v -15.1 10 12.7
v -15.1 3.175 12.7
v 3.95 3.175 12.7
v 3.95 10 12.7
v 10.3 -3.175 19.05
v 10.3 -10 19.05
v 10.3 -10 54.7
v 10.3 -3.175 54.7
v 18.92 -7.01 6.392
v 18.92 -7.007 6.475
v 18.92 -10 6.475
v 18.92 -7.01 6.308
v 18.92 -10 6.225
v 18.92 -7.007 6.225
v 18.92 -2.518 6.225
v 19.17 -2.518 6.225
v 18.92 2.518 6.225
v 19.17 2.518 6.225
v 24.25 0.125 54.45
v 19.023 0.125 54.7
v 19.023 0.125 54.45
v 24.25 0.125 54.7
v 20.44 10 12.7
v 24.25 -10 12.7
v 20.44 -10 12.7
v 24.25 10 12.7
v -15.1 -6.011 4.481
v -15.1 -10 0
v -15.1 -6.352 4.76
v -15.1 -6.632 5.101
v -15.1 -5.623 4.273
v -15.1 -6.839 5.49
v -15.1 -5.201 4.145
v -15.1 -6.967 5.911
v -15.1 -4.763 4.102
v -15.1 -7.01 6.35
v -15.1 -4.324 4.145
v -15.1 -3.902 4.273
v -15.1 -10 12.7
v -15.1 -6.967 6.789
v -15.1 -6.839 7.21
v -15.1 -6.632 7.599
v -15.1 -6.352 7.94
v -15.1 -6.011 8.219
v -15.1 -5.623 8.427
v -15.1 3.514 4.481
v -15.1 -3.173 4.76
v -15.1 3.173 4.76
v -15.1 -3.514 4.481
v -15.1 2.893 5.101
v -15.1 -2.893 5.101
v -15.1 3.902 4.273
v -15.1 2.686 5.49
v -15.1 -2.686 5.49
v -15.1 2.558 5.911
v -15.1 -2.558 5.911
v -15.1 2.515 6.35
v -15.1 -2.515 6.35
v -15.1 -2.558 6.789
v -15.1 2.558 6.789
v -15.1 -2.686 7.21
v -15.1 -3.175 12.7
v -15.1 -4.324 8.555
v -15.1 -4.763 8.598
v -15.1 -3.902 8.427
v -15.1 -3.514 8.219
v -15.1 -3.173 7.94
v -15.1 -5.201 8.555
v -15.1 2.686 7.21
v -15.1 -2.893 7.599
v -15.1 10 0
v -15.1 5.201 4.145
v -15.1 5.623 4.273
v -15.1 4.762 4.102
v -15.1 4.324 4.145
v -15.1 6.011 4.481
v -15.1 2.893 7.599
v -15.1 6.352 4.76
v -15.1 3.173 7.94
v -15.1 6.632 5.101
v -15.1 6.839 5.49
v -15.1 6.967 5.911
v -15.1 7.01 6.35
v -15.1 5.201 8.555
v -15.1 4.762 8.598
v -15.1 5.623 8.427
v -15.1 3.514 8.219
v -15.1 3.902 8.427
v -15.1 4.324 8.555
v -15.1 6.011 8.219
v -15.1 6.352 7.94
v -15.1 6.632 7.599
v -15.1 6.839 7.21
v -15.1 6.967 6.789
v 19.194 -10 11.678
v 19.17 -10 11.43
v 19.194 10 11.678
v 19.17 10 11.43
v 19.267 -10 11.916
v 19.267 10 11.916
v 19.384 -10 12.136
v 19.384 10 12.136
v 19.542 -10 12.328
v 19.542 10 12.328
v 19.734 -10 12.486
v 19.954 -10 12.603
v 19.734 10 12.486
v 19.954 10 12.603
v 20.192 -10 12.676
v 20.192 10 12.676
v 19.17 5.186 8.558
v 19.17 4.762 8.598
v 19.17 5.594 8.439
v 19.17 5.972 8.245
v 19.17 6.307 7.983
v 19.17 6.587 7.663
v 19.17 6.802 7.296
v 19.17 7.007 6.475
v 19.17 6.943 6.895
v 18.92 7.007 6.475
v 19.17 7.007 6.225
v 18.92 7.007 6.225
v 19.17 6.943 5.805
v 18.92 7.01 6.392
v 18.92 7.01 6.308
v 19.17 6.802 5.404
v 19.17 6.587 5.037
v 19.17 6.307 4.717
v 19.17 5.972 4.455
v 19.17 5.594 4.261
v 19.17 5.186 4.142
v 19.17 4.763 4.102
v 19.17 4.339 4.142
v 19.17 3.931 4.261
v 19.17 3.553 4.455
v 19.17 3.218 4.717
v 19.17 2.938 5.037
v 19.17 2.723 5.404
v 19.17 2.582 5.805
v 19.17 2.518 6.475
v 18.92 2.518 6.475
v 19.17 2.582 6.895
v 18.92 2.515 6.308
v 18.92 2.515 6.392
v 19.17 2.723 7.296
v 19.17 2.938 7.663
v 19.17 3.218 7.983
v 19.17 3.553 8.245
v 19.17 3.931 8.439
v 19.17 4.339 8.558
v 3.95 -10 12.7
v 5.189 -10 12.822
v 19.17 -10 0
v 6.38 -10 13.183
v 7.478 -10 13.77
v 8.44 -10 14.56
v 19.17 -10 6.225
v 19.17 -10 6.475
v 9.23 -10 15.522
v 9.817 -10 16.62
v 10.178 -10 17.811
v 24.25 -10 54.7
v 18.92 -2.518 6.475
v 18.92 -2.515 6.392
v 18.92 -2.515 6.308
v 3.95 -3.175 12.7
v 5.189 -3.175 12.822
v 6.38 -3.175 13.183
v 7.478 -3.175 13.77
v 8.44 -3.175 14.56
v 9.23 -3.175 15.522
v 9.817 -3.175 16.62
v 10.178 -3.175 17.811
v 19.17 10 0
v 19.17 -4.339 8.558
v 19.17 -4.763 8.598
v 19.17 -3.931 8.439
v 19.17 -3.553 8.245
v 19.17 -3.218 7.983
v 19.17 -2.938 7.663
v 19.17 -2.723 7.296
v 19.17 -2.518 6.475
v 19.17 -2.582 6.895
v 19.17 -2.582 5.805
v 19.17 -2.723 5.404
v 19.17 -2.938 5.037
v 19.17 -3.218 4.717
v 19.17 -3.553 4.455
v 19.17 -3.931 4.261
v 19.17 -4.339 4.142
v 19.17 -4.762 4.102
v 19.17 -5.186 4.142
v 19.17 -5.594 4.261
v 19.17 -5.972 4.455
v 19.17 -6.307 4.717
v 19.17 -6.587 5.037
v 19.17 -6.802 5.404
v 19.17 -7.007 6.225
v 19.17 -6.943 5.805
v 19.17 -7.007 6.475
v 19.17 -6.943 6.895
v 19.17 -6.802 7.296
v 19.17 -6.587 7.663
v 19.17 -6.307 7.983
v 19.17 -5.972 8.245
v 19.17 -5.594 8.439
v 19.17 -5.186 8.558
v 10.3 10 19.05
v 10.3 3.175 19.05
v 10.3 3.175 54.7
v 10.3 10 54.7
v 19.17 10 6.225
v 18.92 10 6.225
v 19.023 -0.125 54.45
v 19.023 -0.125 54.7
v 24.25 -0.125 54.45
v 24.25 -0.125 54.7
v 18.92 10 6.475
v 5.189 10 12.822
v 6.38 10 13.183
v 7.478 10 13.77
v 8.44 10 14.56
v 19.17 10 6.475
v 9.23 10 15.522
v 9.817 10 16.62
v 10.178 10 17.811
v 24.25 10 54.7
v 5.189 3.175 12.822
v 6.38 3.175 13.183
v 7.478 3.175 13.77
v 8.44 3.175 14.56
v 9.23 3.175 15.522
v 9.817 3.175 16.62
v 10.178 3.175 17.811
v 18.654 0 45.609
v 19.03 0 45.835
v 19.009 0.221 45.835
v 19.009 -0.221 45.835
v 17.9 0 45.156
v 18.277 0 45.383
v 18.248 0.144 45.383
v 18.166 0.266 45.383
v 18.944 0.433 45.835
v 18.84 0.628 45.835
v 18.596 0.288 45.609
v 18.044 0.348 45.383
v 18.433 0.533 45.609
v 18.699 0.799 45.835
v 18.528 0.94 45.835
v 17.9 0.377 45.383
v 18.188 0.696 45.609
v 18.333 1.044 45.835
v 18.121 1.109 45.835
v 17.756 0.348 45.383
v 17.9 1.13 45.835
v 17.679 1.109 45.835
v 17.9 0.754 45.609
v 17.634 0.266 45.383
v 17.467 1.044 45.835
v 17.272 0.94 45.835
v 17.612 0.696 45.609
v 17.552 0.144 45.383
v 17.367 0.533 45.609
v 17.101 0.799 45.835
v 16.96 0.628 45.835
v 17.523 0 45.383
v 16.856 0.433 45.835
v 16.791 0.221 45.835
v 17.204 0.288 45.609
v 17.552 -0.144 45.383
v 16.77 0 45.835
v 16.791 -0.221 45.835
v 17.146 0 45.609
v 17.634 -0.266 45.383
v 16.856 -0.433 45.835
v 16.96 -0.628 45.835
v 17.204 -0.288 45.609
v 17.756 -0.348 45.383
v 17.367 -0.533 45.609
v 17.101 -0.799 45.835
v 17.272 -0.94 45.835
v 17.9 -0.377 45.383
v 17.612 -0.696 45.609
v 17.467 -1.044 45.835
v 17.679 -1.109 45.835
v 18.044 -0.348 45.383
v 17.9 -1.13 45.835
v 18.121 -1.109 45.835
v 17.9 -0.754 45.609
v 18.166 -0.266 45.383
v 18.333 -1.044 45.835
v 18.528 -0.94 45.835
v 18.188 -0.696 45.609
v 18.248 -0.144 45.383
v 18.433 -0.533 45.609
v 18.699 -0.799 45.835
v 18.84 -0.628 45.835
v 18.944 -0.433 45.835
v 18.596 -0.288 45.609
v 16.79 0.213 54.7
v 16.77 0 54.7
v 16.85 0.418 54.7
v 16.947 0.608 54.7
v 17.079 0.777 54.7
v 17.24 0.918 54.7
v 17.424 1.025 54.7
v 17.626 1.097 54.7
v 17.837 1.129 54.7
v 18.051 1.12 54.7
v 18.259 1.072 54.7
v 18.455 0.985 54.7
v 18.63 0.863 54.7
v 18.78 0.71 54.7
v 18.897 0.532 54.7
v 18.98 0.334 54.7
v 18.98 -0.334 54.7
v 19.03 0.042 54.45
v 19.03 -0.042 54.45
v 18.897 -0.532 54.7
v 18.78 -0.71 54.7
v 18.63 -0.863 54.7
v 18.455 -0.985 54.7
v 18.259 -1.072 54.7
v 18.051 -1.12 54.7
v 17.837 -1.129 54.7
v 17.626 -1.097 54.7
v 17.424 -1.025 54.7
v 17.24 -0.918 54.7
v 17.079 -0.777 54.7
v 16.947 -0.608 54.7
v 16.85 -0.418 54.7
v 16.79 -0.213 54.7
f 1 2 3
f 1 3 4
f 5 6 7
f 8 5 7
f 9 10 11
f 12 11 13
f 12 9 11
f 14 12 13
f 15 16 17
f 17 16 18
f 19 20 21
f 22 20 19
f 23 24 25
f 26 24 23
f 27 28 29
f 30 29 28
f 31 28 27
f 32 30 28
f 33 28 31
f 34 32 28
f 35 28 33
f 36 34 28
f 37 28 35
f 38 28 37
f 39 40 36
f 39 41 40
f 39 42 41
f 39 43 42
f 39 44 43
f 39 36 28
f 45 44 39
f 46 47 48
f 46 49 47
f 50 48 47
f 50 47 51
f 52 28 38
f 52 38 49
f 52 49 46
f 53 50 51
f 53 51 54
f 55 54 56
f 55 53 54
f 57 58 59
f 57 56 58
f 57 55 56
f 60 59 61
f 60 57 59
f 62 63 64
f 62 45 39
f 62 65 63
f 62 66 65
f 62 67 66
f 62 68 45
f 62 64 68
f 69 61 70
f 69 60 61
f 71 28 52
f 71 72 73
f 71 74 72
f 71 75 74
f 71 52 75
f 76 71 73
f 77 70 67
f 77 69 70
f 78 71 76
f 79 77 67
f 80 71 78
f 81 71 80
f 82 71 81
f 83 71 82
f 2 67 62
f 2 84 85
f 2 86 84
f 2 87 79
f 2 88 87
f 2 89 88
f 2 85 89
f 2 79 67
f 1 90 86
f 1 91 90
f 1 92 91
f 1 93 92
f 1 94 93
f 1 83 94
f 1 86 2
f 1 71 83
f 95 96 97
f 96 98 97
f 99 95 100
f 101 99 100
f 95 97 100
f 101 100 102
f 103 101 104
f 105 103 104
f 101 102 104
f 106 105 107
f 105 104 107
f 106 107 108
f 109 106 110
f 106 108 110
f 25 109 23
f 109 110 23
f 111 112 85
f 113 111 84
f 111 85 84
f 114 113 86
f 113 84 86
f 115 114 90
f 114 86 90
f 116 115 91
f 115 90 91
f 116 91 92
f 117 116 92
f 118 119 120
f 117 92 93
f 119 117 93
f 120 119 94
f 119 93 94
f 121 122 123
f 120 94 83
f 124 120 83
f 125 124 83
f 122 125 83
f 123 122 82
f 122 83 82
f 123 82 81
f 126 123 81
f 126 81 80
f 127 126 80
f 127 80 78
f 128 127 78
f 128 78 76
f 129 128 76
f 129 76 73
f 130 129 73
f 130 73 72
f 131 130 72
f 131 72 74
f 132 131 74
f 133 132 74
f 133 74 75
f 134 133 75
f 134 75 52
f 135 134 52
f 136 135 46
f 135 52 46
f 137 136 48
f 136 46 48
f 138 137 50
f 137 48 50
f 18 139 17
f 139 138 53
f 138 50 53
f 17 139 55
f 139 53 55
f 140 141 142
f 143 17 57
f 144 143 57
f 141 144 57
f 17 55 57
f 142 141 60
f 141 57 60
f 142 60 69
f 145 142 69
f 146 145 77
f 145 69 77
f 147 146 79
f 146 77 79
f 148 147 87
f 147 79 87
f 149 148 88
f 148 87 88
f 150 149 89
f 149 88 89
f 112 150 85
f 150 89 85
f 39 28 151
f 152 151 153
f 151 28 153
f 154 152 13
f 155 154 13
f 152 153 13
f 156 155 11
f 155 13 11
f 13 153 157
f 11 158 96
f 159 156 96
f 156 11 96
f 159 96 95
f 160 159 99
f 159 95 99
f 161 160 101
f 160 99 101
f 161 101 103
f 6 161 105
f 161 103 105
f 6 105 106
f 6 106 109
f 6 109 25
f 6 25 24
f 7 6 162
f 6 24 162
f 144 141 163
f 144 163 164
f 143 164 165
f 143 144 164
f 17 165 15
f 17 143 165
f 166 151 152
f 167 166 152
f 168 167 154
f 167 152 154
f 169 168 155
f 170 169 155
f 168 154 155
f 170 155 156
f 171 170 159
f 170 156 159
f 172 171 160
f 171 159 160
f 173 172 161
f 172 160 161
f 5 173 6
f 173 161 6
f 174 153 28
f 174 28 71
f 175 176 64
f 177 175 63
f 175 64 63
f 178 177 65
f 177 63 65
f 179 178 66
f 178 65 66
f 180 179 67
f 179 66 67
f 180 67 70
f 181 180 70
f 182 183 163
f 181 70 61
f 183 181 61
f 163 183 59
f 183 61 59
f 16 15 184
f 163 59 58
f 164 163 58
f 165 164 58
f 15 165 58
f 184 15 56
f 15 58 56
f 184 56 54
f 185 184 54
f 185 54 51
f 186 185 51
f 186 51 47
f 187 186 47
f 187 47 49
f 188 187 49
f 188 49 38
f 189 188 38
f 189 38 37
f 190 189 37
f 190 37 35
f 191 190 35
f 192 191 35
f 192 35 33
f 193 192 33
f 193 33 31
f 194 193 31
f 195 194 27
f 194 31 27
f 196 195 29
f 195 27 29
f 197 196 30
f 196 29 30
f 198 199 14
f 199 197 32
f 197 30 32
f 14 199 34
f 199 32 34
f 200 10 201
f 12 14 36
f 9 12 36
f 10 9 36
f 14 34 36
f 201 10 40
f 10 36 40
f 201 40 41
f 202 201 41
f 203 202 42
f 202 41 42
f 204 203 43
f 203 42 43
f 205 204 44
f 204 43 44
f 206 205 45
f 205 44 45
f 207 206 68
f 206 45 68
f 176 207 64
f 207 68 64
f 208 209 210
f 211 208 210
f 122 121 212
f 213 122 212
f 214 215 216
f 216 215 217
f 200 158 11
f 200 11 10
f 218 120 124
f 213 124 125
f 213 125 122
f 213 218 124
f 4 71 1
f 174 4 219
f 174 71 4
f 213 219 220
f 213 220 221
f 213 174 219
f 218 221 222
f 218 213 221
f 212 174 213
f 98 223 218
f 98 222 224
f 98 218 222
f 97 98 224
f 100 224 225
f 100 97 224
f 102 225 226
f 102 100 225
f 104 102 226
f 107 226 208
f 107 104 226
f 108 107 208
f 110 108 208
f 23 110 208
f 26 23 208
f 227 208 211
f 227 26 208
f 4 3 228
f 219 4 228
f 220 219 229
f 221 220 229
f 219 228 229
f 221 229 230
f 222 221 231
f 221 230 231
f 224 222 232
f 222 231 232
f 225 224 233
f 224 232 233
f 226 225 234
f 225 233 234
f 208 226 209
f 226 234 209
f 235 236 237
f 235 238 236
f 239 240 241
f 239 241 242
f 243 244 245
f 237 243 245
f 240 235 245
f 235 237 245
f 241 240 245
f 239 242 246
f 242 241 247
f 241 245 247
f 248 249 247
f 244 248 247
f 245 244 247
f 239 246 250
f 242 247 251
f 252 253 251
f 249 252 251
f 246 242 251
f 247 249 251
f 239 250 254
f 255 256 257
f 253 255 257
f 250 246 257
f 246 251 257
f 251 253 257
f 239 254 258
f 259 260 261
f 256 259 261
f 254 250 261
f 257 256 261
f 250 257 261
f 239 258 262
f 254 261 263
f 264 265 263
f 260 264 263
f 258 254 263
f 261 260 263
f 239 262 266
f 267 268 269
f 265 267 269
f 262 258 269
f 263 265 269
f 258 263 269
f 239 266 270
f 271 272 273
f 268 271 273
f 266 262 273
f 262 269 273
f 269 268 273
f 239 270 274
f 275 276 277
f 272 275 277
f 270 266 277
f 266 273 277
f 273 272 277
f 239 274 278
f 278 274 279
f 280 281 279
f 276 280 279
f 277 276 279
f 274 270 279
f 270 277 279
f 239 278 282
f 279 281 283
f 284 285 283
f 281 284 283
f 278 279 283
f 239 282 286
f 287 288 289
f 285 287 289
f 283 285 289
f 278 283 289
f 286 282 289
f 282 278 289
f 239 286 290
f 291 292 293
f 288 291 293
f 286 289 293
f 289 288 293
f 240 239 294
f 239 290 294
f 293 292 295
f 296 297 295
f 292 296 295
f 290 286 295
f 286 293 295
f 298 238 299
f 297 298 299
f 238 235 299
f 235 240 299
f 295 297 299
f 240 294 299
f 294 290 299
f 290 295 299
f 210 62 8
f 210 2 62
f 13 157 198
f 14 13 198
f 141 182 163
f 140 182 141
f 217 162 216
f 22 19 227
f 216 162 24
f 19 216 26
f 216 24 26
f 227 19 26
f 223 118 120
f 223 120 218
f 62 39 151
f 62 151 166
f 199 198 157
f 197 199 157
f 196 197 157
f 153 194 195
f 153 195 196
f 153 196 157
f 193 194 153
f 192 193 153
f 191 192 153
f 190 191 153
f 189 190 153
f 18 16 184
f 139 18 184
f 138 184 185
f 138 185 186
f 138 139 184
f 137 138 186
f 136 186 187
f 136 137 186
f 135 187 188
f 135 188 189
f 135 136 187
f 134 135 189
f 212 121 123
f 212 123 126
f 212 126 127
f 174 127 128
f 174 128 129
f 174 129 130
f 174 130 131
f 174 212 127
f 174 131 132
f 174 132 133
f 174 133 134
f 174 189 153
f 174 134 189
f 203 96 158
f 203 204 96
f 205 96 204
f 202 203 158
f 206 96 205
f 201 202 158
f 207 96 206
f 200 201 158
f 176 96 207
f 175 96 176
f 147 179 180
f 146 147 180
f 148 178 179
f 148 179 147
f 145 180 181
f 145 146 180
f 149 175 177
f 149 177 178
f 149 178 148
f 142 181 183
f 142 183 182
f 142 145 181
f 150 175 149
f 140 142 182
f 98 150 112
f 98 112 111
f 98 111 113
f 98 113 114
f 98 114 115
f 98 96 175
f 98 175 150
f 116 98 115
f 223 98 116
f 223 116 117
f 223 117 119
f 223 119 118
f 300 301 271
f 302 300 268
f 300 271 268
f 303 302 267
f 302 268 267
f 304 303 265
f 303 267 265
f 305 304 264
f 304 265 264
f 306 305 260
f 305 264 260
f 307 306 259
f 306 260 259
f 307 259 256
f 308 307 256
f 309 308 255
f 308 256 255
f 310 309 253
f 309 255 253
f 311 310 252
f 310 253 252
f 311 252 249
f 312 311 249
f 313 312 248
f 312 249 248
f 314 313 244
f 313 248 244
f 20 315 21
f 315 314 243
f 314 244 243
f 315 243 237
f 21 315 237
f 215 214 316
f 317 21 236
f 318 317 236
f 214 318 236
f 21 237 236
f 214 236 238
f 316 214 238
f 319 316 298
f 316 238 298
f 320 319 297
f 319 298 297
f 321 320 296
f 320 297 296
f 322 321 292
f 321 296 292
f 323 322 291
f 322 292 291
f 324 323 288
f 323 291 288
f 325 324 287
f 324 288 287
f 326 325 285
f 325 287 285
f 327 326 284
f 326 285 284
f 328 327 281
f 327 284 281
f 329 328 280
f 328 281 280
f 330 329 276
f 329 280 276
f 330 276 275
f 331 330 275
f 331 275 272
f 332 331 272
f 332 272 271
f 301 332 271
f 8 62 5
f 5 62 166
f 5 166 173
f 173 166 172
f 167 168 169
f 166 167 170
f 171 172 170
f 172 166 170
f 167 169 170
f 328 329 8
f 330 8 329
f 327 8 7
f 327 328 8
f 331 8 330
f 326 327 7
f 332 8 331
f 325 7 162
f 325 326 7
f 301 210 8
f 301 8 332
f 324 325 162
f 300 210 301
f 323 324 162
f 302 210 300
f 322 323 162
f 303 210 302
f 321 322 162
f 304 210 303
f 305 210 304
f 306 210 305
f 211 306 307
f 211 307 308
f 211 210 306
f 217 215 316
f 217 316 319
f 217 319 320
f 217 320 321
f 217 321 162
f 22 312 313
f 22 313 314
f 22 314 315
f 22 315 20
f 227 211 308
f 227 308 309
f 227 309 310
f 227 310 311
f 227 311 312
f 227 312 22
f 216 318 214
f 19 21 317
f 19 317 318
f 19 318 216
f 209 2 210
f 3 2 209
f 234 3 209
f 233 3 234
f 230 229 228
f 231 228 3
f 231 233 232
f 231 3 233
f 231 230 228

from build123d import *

# Parameters (mm, degrees)
SKETCH1_W                 = 24.25
SKETCH1_H                 = 20
EXTRUDE1_DEPTH            = 54.7
CUT_EXTRUDE1_DEPTH        = 21
SKETCH5_W                 = 12.7
SKETCH5_H                 = 20
EXTRUDE2_DEPTH            = 15.1
F_8_CLEARANCE_HOLE1_D     = 4.4958
F_4_40_TAPPED_HOLE1_D     = 2.2606
F_4_40_TAPPED_HOLE1_DEPTH = 8.8646
F_4_40_TAPPED_HOLE1_TIP   = 0.679152758
SKETCH11_W                = 12.7
SKETCH11_H                = 20
CUT_EXTRUDE2_DEPTH        = 5.08
FILLET1_R                 = 1.27
SKETCH12_W                = 0.25
SKETCH12_H                = 20
CUT_EXTRUDE3_DEPTH        = 0.25
EXTRUDE3_DEPTH            = 3.175
SKETCH14_W                = 6.35
SKETCH14_H                = 0.25
CUT_EXTRUDE4_DEPTH        = 0.25


with BuildPart() as part:
    # Sketch1 → Extrude1 (new body)
    with BuildSketch(Plane.XY):
        with Locations((12.125, 0)):
            Rectangle(SKETCH1_W, SKETCH1_H)
    extrude(amount=EXTRUDE1_DEPTH)

    # Sketch4 → Cut-Extrude1 (cut, through all)
    with BuildSketch(Plane.XZ.offset(10)):
        with BuildLine():
            Line((0, 12.7), (3.95, 12.7))
            ThreePointArc((3.95, 12.7), (8.440128061, 14.559871939), (10.3, 19.05))
            Line((10.3, 19.05), (10.3, 54.7))
            Line((10.3, 54.7), (0, 54.7))
            Line((0, 54.7), (0, 12.7))
        make_face()
    extrude(amount=-CUT_EXTRUDE1_DEPTH, mode=Mode.SUBTRACT)

    # Sketch5 → Extrude2 (add)
    with BuildSketch(Plane.ZY):
        with Locations((6.35, 0)):
            Rectangle(SKETCH5_W, SKETCH5_H)
    extrude(amount=EXTRUDE2_DEPTH)

    # #8 Clearance Hole1 (through all)
    with Locations(Plane(origin=(24.25, 0, 0), x_dir=(0, 0, -1), z_dir=(1, 0, 0))):
        with Locations((-6.35, 4.7625), (-6.35, -4.7625)):
            Hole(F_8_CLEARANCE_HOLE1_D / 2)

    # #4-40 Tapped Hole1
    with Locations(Plane.XY.offset(54.7)):
        with Locations((17.9, 0)):
            Hole(F_4_40_TAPPED_HOLE1_D / 2, depth=F_4_40_TAPPED_HOLE1_DEPTH)
            with Locations((0, 0, -(F_4_40_TAPPED_HOLE1_DEPTH + F_4_40_TAPPED_HOLE1_TIP / 2))):  # 118° drill point
                Cone(0, F_4_40_TAPPED_HOLE1_D / 2, F_4_40_TAPPED_HOLE1_TIP, mode=Mode.SUBTRACT)

    # Sketch11 → Cut-Extrude2 (cut)
    with BuildSketch(Plane(origin=(24.25, 0, 0), x_dir=(0, 0, -1), z_dir=(1, 0, 0))):
        with Locations((-6.35, 0)):
            Rectangle(SKETCH11_W, SKETCH11_H)
    extrude(amount=-CUT_EXTRUDE2_DEPTH, mode=Mode.SUBTRACT)

    # Fillet1
    fillet1_edges = [part.edges().sort_by_distance(p)[0] for p in [
        (19.17, 0, 12.7),
    ]]
    fillet(fillet1_edges, radius=FILLET1_R)

    # Sketch12 → Cut-Extrude3 (cut)
    with BuildSketch(Plane(origin=(19.17, 0, 0), x_dir=(0, 0, -1), z_dir=(1, 0, 0))):
        with Locations((-6.35, 0)):
            Rectangle(SKETCH12_W, SKETCH12_H)
    extrude(amount=-CUT_EXTRUDE3_DEPTH, mode=Mode.SUBTRACT)

    # Sketch13 → Extrude3 (add, symmetric)
    with BuildSketch(Plane(origin=(0, 0, 0), x_dir=(1, 0, 0), z_dir=(0, 1, 0))):
        Polygon((-15.1, -12.7), (10.3, -54.7), (10.3, -12.7), align=None)
    extrude(amount=EXTRUDE3_DEPTH, both=True)

    # Sketch14 → Cut-Extrude4 (cut)
    with BuildSketch(Plane.XY.offset(54.7)):
        with Locations((21.075, 0)):
            Rectangle(SKETCH14_W, SKETCH14_H)
    extrude(amount=-CUT_EXTRUDE4_DEPTH, mode=Mode.SUBTRACT)


solid = part.part
